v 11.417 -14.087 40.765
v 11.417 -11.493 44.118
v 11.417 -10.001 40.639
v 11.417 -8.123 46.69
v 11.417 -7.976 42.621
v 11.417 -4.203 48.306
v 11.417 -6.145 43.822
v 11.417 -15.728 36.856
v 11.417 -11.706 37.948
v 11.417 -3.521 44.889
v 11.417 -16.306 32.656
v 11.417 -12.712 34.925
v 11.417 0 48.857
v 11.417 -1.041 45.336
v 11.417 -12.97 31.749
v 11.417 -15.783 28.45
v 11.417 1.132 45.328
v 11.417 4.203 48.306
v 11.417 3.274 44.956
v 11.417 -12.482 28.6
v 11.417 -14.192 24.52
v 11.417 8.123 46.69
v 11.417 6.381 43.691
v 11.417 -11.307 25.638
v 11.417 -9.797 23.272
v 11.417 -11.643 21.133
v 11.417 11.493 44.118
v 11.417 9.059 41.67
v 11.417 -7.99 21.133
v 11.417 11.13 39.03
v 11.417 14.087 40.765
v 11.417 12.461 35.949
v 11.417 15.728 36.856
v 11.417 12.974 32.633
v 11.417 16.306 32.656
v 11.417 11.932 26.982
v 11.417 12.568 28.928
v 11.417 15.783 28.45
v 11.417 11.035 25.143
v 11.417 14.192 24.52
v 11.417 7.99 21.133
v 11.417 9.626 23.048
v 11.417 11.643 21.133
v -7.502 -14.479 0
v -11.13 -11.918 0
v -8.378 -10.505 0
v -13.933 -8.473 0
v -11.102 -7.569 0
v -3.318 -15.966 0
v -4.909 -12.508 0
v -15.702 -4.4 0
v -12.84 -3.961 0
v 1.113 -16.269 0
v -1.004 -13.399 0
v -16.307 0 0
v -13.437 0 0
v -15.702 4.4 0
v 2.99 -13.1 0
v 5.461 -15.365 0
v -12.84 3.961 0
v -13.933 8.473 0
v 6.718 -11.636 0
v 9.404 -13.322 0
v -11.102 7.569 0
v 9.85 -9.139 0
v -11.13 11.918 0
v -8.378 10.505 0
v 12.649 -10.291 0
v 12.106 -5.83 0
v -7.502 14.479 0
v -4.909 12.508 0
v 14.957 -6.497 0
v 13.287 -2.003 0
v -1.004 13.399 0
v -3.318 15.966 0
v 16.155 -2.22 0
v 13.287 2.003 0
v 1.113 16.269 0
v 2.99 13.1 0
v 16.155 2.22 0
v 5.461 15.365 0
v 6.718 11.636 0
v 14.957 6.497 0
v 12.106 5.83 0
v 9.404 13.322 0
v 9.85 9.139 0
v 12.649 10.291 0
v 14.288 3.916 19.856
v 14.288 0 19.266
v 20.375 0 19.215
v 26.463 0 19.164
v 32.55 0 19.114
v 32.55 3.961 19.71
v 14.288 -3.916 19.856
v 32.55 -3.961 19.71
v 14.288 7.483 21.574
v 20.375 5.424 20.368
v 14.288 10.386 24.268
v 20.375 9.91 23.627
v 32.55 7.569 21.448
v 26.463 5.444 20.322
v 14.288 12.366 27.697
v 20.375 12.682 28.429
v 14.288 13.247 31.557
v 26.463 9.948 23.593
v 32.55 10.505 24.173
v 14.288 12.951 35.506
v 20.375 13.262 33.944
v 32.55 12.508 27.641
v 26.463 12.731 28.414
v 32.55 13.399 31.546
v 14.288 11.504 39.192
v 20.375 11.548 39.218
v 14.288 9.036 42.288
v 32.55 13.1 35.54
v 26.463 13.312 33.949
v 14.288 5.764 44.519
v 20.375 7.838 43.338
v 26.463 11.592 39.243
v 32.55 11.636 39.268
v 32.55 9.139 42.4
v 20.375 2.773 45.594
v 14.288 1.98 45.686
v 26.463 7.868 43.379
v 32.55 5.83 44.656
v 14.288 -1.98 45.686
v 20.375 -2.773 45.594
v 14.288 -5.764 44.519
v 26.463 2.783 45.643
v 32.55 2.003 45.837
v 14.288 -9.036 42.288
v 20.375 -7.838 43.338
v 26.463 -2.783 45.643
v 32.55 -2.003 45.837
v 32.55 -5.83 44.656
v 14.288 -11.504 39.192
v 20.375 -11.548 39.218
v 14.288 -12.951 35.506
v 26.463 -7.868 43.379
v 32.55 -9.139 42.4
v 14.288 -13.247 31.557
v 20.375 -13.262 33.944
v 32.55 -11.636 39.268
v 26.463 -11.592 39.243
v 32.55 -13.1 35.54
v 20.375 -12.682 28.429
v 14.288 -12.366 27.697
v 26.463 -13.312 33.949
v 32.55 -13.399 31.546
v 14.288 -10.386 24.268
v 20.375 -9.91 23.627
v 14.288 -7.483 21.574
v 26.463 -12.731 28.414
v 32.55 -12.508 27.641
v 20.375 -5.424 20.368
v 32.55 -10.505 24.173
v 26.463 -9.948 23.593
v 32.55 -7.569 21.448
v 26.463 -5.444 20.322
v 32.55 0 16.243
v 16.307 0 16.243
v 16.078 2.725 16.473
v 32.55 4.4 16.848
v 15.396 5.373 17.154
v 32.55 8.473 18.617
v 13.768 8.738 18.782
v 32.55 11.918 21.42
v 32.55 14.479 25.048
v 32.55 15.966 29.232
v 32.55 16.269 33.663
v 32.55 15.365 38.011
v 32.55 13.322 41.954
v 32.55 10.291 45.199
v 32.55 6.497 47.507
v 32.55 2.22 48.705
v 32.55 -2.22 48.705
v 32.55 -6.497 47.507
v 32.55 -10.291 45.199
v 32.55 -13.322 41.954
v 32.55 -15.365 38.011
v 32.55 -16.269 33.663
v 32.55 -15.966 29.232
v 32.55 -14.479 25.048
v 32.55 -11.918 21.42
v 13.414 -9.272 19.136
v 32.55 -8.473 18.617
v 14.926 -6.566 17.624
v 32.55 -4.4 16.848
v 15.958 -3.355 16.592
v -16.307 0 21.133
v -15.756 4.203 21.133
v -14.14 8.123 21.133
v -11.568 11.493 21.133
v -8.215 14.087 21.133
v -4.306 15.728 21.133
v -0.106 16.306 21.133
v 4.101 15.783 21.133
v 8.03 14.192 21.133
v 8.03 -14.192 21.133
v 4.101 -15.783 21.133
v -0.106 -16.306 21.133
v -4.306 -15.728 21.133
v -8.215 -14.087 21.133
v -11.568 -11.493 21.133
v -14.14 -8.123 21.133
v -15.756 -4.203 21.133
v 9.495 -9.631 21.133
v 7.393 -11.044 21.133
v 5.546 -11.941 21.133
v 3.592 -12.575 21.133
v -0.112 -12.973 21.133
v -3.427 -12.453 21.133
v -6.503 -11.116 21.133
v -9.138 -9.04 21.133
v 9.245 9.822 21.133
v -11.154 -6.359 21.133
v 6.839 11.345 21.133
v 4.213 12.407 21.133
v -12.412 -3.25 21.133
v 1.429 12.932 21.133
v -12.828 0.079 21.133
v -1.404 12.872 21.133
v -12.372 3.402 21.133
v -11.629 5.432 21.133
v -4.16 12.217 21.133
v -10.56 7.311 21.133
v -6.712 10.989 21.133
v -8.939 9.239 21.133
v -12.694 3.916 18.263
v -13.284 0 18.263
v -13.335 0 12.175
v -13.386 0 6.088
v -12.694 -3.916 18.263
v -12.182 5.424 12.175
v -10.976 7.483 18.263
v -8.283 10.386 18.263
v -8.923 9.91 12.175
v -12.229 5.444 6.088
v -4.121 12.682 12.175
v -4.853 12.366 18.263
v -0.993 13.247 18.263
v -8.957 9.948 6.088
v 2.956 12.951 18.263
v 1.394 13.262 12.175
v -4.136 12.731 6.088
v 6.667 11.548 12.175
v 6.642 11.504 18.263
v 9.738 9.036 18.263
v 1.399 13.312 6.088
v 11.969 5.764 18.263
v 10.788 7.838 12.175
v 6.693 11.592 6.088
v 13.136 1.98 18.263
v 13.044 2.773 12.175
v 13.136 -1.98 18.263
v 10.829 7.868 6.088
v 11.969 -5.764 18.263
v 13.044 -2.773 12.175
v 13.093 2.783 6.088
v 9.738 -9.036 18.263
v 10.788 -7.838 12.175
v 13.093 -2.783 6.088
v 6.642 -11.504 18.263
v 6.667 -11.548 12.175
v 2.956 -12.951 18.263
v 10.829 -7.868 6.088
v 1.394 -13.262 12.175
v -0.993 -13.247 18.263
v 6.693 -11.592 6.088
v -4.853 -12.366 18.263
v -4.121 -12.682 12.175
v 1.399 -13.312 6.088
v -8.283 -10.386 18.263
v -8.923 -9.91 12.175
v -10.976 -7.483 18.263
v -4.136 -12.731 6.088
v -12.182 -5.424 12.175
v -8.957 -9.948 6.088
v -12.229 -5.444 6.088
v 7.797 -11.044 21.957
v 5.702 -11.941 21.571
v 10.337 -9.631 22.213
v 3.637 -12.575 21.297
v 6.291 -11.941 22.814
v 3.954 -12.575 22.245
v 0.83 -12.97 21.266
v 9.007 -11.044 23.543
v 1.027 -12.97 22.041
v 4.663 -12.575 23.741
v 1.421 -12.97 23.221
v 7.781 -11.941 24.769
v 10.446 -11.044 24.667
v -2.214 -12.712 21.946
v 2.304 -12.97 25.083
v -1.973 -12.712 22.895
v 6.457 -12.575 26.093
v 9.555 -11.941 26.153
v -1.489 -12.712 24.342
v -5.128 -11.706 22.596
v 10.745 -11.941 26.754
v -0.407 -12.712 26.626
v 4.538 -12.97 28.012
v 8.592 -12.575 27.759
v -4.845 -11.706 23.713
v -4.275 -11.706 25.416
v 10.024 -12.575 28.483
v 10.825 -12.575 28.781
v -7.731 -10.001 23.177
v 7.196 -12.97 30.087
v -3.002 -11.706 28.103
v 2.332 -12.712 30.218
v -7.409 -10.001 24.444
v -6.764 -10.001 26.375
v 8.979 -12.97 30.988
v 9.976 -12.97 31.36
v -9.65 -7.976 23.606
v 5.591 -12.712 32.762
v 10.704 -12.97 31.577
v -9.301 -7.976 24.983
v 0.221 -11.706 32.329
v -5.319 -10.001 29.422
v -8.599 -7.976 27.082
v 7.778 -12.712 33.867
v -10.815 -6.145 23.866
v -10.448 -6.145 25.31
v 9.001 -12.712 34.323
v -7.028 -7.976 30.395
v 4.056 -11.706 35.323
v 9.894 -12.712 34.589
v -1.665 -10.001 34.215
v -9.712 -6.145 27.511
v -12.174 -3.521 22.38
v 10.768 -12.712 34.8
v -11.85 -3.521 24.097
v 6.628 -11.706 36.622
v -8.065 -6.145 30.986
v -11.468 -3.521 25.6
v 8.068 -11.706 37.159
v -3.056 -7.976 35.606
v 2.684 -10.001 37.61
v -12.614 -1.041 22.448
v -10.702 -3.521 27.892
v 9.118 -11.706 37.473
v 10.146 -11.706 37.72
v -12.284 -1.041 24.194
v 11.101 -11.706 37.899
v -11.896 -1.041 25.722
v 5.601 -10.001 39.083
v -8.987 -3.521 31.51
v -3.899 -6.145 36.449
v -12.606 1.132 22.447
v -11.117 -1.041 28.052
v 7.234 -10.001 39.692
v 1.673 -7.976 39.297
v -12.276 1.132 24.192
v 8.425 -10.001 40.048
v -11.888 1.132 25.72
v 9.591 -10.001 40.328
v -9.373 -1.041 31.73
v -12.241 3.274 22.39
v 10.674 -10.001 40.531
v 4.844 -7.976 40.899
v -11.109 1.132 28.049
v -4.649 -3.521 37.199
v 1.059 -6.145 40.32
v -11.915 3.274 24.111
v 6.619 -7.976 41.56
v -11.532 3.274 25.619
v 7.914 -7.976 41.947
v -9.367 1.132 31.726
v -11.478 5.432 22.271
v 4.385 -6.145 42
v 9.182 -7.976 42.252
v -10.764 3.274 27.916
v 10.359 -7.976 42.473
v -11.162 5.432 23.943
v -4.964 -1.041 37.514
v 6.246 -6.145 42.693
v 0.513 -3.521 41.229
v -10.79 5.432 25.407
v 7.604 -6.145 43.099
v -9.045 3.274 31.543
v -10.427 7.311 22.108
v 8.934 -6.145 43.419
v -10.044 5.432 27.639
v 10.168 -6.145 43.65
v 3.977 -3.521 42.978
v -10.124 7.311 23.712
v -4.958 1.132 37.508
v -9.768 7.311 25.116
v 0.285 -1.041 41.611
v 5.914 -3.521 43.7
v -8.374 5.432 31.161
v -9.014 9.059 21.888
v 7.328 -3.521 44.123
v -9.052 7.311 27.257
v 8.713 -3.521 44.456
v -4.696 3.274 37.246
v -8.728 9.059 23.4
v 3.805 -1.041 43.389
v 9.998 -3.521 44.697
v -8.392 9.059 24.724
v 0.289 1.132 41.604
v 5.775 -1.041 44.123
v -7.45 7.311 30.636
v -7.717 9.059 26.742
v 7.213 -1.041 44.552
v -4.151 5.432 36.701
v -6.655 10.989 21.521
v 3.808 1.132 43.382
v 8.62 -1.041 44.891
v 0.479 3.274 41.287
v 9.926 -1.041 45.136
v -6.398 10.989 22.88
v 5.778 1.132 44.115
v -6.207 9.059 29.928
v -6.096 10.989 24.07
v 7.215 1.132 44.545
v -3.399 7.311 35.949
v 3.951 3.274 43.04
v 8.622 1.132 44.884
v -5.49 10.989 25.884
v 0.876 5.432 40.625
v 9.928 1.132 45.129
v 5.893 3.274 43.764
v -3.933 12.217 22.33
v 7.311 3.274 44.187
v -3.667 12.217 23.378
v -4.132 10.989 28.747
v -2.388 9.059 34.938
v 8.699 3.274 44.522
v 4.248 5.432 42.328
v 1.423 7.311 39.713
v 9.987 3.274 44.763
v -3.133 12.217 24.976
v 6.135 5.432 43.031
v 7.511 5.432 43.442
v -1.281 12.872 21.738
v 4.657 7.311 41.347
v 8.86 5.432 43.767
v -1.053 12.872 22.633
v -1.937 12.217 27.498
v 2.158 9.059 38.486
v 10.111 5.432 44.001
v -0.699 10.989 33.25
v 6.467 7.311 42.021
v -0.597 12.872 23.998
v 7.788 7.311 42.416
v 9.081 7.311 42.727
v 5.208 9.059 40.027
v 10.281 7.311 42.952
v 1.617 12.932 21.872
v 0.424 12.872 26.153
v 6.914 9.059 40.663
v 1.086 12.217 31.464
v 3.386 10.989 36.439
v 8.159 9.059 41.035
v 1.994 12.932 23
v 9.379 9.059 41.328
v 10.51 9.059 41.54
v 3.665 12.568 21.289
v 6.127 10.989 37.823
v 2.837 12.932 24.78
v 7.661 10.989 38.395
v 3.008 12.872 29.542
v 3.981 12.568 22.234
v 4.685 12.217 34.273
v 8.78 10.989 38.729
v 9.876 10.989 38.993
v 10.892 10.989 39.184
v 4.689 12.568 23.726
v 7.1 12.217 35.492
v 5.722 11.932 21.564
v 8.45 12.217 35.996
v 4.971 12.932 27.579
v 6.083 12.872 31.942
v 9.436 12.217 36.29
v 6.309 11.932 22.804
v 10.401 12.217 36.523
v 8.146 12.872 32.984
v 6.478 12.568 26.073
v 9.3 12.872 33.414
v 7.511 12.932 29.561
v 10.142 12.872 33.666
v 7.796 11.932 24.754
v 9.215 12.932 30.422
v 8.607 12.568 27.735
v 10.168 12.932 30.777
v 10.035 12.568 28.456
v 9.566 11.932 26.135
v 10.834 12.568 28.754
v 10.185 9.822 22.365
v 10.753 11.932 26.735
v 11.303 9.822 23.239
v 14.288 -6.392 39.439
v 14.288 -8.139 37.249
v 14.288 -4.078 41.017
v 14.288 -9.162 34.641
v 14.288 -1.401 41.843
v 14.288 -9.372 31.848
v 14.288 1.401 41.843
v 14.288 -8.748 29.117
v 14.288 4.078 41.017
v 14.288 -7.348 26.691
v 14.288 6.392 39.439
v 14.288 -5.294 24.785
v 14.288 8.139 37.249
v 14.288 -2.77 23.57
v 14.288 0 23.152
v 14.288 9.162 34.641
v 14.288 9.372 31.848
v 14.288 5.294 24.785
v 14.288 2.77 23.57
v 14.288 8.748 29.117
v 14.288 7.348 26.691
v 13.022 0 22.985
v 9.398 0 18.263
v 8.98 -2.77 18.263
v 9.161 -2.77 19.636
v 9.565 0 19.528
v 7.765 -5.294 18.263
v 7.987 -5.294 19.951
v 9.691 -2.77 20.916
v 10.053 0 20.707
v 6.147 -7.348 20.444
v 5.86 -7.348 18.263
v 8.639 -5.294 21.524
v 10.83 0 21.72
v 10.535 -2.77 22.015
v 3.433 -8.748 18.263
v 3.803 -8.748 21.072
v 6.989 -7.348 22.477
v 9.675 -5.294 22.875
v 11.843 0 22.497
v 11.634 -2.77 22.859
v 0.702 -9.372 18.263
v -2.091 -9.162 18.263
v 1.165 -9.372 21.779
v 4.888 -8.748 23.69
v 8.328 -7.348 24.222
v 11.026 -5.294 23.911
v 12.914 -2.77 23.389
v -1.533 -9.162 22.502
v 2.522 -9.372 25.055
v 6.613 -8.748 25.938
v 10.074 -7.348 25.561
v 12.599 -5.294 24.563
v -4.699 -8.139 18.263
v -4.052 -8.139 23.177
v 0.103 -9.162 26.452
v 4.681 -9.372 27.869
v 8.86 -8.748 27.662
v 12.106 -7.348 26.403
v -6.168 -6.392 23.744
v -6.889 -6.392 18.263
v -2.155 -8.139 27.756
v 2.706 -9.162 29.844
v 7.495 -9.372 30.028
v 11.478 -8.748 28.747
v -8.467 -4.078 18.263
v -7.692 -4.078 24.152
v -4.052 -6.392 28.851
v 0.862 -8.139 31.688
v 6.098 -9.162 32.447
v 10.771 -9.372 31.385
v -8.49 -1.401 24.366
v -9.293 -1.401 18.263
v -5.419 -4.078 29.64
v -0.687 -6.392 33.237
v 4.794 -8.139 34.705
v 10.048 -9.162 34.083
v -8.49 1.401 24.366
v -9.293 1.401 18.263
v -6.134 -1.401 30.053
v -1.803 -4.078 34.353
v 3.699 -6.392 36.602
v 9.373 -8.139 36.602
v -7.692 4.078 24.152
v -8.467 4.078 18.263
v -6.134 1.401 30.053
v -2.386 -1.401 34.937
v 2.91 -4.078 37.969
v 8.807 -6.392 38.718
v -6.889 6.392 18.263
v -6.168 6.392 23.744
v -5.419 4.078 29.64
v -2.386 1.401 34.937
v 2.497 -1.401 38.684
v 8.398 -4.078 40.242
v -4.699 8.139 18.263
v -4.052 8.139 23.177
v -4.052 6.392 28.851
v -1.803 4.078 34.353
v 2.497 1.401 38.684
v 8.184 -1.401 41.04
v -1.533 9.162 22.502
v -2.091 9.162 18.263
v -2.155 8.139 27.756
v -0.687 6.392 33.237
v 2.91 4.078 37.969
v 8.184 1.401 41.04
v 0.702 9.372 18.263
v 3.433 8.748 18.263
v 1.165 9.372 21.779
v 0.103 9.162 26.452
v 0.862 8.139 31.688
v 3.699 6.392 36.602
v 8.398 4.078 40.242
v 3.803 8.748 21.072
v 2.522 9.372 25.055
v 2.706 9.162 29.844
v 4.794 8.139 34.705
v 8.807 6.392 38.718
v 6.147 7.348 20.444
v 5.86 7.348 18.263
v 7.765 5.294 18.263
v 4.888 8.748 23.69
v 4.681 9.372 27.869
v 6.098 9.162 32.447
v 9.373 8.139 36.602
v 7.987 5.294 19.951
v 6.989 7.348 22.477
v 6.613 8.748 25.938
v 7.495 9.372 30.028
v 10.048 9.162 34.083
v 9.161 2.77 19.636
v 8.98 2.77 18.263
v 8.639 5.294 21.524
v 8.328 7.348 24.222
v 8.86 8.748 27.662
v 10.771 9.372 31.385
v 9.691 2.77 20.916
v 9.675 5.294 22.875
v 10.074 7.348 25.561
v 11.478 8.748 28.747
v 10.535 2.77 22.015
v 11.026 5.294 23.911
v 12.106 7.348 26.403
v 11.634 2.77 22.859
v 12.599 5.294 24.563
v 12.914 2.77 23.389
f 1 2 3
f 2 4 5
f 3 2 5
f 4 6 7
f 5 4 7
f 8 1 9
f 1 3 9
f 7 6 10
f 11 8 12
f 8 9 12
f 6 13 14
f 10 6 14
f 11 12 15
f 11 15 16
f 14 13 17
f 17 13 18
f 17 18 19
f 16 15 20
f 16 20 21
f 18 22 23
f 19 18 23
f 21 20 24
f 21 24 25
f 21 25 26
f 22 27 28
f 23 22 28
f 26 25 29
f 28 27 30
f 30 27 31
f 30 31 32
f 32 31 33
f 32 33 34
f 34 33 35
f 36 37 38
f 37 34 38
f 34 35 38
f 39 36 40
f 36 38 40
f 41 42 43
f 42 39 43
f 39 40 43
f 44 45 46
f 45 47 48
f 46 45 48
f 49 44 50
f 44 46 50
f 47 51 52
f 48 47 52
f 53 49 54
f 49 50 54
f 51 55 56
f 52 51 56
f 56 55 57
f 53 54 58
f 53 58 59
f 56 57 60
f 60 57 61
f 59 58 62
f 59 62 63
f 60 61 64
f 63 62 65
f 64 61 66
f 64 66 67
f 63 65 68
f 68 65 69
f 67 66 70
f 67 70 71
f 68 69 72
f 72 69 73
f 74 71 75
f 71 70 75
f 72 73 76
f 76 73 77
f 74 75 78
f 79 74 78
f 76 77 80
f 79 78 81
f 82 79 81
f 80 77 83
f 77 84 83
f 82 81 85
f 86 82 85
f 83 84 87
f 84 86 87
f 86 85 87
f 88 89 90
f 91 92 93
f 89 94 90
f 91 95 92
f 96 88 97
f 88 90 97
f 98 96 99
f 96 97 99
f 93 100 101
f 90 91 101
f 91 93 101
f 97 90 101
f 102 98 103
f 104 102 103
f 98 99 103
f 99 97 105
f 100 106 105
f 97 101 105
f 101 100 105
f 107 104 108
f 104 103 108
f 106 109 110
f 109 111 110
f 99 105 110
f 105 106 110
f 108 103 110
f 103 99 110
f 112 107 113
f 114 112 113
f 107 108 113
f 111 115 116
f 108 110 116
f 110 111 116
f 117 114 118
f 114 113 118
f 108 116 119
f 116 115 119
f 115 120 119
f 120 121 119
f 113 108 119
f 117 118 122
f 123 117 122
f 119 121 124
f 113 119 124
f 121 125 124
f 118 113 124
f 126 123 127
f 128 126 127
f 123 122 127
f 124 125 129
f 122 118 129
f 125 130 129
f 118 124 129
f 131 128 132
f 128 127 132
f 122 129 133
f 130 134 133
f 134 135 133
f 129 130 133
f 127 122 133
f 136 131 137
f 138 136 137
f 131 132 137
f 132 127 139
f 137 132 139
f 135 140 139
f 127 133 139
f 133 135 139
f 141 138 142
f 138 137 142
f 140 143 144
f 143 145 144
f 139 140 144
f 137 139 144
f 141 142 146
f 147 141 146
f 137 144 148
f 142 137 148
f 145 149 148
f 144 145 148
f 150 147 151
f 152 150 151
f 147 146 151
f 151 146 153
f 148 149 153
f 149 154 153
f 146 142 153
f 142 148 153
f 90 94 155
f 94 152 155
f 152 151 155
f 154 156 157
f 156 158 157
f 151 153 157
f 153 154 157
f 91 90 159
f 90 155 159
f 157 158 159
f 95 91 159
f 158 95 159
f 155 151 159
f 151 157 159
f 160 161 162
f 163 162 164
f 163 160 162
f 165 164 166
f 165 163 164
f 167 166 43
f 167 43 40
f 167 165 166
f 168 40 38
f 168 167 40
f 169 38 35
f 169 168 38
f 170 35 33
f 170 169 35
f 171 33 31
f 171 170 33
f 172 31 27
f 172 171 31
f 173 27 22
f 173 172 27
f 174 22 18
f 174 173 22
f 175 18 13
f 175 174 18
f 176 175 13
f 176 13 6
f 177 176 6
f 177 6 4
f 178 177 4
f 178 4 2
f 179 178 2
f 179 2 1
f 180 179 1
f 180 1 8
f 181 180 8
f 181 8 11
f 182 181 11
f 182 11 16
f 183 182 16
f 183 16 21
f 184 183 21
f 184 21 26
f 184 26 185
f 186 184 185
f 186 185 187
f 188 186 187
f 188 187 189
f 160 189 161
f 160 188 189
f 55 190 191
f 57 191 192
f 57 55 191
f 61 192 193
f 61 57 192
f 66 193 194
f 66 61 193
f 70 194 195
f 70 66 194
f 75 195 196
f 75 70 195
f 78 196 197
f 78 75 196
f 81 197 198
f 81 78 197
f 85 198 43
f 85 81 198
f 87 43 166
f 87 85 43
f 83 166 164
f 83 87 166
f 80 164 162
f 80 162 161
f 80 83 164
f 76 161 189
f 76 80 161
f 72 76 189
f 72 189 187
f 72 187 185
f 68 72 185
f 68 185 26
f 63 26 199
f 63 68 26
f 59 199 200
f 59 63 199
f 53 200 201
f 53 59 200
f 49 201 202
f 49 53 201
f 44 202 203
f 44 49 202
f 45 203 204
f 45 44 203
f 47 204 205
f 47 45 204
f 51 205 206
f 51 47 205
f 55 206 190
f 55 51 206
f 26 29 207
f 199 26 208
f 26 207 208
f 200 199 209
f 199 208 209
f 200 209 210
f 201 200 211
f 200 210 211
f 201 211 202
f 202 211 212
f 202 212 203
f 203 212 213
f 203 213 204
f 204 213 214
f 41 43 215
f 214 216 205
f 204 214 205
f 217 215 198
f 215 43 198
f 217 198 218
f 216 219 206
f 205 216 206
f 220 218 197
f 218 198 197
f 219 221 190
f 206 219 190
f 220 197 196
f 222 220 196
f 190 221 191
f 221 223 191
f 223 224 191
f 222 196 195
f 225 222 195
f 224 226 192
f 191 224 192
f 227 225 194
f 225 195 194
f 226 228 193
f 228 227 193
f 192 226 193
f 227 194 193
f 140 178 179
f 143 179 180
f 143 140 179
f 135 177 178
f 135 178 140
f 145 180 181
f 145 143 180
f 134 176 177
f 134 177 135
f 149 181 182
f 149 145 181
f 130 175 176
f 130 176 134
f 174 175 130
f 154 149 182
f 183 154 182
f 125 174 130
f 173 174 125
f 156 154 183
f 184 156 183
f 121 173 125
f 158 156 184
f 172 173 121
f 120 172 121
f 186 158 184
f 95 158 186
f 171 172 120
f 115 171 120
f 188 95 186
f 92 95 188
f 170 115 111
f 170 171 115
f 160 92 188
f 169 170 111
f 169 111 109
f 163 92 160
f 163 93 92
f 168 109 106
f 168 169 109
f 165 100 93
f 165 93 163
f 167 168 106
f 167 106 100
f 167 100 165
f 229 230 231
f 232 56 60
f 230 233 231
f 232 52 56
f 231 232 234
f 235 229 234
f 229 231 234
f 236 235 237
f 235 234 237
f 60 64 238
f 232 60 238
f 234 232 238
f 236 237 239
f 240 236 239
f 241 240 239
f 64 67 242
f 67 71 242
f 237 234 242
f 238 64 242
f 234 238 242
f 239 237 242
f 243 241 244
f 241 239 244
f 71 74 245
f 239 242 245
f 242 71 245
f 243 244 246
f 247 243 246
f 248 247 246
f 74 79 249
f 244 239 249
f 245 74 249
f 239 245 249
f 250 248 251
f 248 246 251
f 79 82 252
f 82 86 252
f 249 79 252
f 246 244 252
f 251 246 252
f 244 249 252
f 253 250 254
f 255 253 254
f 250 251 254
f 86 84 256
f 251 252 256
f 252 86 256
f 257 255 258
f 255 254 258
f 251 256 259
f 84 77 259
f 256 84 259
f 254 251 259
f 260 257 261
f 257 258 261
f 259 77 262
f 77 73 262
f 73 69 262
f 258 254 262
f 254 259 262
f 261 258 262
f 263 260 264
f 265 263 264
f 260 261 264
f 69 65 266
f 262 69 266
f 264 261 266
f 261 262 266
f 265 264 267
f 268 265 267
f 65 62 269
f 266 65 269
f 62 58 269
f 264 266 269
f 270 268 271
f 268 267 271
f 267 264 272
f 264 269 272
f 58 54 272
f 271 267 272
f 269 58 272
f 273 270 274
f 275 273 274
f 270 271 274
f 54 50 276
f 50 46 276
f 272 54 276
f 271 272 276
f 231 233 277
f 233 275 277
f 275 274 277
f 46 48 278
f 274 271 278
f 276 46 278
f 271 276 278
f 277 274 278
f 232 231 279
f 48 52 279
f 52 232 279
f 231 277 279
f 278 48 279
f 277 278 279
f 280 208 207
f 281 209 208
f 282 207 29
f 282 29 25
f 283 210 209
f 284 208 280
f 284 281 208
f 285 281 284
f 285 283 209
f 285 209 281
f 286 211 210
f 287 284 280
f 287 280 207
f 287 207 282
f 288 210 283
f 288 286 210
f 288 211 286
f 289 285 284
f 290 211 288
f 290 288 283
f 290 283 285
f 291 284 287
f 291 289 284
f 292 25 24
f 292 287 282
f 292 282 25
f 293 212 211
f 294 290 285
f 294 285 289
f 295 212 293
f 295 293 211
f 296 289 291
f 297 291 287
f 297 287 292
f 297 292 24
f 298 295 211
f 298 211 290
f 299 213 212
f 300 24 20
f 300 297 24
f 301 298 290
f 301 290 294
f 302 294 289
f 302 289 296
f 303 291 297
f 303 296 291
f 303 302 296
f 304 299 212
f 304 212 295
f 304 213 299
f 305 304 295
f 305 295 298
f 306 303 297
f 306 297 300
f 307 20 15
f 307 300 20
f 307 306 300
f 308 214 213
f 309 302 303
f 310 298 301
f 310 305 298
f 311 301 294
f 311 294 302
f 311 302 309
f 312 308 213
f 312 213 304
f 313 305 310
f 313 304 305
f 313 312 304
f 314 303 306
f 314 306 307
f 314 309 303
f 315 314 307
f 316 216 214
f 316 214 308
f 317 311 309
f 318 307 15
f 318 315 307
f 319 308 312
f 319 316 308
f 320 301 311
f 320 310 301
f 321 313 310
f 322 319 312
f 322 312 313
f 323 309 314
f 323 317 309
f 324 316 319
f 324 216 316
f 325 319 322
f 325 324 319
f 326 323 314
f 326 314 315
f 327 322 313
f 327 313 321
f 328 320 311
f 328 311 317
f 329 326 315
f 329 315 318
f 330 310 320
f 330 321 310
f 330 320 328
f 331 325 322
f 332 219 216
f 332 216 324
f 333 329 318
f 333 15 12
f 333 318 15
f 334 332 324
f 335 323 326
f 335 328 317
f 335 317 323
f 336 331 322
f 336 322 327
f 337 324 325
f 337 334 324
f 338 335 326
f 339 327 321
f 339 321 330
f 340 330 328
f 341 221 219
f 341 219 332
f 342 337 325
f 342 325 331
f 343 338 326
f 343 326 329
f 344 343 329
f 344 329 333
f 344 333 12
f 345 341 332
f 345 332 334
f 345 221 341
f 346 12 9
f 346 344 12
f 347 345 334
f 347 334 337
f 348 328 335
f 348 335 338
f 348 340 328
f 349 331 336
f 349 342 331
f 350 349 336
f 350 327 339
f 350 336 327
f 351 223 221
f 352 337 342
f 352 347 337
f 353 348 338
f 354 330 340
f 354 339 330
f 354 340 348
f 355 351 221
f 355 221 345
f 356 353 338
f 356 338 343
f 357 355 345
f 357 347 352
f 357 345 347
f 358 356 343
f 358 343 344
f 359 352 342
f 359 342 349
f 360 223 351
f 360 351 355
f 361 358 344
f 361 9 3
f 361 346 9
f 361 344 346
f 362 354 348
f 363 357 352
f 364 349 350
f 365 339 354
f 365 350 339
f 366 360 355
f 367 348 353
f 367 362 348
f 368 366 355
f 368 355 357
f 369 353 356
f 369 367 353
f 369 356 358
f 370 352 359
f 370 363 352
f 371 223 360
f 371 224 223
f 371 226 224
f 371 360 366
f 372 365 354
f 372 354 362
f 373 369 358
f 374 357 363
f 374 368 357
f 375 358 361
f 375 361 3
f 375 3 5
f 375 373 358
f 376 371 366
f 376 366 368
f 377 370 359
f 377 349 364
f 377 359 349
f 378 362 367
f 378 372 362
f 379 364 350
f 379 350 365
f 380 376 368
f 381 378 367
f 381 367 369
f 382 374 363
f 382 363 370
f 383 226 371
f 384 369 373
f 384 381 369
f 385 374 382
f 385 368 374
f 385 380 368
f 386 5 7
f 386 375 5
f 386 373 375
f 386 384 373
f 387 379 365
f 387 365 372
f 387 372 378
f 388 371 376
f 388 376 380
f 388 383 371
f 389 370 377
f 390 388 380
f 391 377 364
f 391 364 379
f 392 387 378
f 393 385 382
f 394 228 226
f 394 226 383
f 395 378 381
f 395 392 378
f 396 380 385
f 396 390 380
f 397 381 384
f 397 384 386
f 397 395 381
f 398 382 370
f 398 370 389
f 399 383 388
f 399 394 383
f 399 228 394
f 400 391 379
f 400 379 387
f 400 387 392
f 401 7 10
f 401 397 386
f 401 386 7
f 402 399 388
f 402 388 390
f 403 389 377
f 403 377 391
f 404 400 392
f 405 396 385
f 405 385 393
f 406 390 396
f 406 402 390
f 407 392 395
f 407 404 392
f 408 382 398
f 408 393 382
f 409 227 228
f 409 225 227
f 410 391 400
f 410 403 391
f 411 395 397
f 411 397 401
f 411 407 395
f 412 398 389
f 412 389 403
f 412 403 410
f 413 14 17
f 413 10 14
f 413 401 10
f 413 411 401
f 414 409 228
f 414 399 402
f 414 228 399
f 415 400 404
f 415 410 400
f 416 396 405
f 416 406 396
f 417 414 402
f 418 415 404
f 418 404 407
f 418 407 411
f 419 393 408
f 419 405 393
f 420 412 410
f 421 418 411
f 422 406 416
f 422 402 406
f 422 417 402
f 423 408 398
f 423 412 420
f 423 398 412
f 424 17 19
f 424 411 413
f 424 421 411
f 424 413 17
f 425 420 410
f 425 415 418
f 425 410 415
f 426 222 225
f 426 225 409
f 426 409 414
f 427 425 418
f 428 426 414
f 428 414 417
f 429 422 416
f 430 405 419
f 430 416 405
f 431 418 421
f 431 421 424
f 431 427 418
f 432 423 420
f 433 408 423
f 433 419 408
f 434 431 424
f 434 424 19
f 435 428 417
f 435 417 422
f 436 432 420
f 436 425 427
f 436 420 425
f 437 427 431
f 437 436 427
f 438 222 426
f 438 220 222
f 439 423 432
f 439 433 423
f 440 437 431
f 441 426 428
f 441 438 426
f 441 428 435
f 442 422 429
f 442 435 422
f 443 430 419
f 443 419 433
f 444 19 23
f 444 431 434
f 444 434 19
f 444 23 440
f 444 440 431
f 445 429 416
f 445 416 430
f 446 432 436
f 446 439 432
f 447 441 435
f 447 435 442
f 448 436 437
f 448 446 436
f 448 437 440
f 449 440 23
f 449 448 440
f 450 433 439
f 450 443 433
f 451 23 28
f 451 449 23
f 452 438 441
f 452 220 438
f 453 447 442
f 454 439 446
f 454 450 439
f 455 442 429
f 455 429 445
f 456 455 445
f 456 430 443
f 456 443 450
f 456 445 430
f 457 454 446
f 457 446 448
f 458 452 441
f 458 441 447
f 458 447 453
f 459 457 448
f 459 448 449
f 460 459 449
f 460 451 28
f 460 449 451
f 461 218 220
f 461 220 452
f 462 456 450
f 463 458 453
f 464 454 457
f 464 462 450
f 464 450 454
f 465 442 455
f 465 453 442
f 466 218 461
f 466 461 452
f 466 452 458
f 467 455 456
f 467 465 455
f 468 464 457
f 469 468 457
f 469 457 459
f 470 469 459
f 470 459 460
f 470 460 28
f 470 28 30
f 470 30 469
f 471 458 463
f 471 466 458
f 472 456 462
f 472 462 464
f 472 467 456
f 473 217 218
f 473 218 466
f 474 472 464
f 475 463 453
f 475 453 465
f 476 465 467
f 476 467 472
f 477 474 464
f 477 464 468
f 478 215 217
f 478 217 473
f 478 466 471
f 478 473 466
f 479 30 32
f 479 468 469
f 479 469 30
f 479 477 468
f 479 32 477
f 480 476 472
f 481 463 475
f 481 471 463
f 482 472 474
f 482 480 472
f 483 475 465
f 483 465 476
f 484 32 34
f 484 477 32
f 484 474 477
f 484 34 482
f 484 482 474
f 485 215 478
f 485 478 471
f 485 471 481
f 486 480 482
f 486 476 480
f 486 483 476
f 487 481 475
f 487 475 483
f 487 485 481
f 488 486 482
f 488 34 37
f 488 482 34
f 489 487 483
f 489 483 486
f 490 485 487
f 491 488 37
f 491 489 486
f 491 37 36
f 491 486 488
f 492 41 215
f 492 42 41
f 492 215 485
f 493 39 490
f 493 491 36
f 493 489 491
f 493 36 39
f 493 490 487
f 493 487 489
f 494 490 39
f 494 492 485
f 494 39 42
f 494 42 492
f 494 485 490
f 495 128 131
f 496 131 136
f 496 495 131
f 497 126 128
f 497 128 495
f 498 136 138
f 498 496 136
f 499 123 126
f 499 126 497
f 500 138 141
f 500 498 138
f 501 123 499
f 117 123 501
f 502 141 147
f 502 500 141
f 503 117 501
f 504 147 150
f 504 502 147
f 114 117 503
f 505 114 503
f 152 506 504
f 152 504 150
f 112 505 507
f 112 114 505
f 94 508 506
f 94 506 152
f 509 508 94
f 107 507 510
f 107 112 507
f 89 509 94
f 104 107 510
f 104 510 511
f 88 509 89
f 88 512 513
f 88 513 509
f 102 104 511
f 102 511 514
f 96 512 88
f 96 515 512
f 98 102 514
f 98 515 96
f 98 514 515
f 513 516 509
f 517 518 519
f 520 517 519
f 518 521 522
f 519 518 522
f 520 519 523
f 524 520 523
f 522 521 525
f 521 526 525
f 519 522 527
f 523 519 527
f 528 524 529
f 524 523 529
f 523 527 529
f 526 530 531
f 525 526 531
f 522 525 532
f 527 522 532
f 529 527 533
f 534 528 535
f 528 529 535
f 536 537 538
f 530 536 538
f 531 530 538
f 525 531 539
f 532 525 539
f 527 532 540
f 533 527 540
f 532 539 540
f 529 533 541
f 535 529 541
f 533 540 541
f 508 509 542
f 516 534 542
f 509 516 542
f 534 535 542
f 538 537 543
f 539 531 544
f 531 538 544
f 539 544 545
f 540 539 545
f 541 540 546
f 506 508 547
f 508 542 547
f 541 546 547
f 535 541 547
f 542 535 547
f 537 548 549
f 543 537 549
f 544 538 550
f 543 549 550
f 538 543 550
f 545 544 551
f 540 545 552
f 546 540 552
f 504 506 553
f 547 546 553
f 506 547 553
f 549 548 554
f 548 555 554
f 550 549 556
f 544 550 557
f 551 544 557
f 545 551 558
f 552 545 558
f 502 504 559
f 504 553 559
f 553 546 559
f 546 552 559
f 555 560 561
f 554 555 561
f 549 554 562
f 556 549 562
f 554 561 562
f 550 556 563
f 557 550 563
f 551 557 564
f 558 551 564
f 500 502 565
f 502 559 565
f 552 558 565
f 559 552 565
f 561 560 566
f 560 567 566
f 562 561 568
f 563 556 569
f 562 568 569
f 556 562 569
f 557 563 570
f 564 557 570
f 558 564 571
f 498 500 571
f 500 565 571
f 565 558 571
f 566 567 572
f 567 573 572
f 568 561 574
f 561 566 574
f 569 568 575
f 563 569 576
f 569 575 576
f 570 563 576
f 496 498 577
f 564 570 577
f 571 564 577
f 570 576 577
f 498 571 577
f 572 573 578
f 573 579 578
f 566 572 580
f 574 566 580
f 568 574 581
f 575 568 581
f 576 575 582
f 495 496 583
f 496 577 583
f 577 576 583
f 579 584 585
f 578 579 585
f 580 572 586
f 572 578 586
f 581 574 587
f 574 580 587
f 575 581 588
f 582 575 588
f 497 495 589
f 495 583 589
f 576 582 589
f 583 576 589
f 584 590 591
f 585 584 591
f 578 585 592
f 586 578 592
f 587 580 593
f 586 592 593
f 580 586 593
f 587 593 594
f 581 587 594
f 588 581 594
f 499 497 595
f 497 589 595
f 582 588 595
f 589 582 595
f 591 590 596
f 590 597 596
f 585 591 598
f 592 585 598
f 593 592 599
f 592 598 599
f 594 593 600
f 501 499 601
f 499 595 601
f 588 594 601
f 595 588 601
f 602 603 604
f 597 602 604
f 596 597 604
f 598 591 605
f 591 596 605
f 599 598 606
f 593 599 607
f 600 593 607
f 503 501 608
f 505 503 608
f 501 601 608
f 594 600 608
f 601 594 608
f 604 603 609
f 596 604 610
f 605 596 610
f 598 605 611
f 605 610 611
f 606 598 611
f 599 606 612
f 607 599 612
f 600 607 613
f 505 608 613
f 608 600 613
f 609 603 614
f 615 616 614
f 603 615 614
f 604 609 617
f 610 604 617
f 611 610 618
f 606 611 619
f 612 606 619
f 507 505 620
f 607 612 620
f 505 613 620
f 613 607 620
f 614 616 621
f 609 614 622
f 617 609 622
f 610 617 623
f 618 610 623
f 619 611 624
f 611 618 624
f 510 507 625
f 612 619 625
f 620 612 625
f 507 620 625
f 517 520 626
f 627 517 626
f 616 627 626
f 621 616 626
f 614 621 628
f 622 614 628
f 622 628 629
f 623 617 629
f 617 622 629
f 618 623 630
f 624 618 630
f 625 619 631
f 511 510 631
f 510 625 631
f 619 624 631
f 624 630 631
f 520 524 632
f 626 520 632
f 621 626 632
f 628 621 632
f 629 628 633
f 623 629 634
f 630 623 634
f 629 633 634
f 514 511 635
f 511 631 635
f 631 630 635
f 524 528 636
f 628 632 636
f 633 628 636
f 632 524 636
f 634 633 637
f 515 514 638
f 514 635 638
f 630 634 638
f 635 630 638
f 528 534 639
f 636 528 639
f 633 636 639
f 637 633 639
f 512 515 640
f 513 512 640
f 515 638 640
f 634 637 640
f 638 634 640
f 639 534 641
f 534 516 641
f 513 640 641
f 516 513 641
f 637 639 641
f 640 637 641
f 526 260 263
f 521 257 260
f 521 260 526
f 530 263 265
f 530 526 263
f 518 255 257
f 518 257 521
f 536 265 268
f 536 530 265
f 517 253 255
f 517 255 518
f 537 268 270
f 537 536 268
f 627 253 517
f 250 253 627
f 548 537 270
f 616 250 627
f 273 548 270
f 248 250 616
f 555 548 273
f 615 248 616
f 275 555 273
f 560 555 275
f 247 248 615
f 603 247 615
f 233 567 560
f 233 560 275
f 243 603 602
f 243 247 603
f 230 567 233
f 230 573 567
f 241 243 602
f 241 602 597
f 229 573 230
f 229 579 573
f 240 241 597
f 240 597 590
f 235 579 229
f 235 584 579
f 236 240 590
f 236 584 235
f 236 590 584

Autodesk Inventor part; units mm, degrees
ref_plane "YZ Plane" through (0, 0, 0) normal (1, 0, 0) x (0, 1, 0)
ref_plane "XZ Plane" through (0, 0, 0) normal (0, 1, 0) x (-1, 0, 0)
ref_plane "XY Plane" through (0, 0, 0) normal (0, 0, 1) x (1, 0, 0)
sketch "Sketch1" plane through (0, 0, 0) normal (0, 1, 0) x (-1, 0, 0)
  line L0 (0, 0) -> (0, 18.2626)
  arc A0 (0, 18.2626) -> (-14.2875, 32.5501) centre (-14.2875, 18.2626) ccw
  line L1 (-14.2875, 32.5501) -> (-32.5501, 32.5501)
  line L2 (-14.2875, 32.5501) -> (0, 32.5501) construction
  line L3 (0, 32.5501) -> (0, 18.2626) construction
  dimension "d0" = 32.5501
  dimension "d1" = 32.5501
  dimension "d2" = 18.2626
sketch "Sketch2" plane through (0, 0, 0) normal (0, 0, 1) x (1, 0, 0)
  circle A0 centre (0, 0) radius 12.9794
  circle A1 centre (0, 0) radius 9.398
  dimension "d3" = 18.796
  dimension "d4" = 25.9588
sweep "Sweep1" add profiles "Sketch2" path "Sketch1"
sketch "Sketch3" plane through (0, 0, 0) normal (0, 0, -1) x (-1, 0, 0)
  circle A0 centre (0, 0) radius 16.3068
  circle A1 centre (0, 0) radius 12.9794 projected
  circle A2 centre (0, 0) radius 11.1887
  dimension "d6" = 32.6136
  dimension "d9" = 22.3774
extrude "Extrusion1" add sketch "Sketch3" against normal blind 21.1328 contours A0 | A1
sketch "Sketch4" plane through (32.5501, 0, 32.5501) normal (1, 0, 0) x (0, 0, -1)
  circle A0 centre (0, 0) radius 9.398 projected
  circle A1 centre (0, 0) radius 11.1887
  circle A2 centre (0, 0) radius 16.3068
  dimension "d10" = 32.6136
  dimension "d11" = 22.3774
extrude "Extrusion2" add sketch "Sketch4" against normal blind 21.1328 contours A2
sketch "Sketch5" plane through (0, 0, 0) normal (0, 0, -1) x (-1, 0, 0)
  circle A0 centre (0, 0) radius 9.398 projected
  circle A1 centre (0, 0) radius 13.4366
  dimension "d14" = 26.8732
sketch "Sketch5 outline for Extrusion3" plane through (0, 0, 0) normal (0, 0, -1) x (-1, 0, 0)
  circle A0 centre (0, 0) radius 13.4366
extrude "Extrusion3" cut sketch "Sketch5 outline for Extrusion3" against normal blind 18.2626 draft -0.47812
sketch "Sketch6" plane through (32.5501, 0, 32.5501) normal (1, 0, 0) x (0, 0, -1)
  circle A0 centre (0, 0) radius 9.398 projected
  circle A1 centre (0, 0) radius 13.4366
  dimension "d17" = 26.8732
sketch "Sketch6 outline for Extrusion4" plane through (32.5501, 0, 32.5501) normal (1, 0, 0) x (0, 0, -1)
  circle A0 centre (0, 0) radius 13.4366
extrude "Extrusion4" cut sketch "Sketch6 outline for Extrusion4" against normal blind 18.2626 draft -0.47812
equation "\"d0\" = G + C1"
equation "\"d1\" = G + C1"
equation "\"d2\" = C1"
equation "\"d3\" = D"
equation "\"d4\" = D + 2 * F1"
equation "\"d6\" = A + 2 * E1"
equation "\"d9\" = D + F1"
equation "\"d7\" = C1 + E1"
equation "\"d10\" = A + 2 * E1"
equation "\"d11\" = D + F1"
equation "\"d12\" = C1 + E1"
equation "\"d14\" = A"
equation "\"d15\" = C1"
equation "\"d17\" = A"
equation "\"d18\" = C1"
equation "\"A\" = 26.8732"
equation "\"C1\" = 18.2626"
equation "\"F1\" = 3.5814"
equation "\"D\" = 18.796"
equation "\"G\" = 14.2875"
equation "\"E1\" = 2.8702"
equation "\"B\" = 26.5684"
equation "\"Size_Designation\" = 0.75"
properties part number "ASTM D 2466 90 Deg Elbow Socket-Type - Schedule 40 3/4" material "PVC-Piping"
